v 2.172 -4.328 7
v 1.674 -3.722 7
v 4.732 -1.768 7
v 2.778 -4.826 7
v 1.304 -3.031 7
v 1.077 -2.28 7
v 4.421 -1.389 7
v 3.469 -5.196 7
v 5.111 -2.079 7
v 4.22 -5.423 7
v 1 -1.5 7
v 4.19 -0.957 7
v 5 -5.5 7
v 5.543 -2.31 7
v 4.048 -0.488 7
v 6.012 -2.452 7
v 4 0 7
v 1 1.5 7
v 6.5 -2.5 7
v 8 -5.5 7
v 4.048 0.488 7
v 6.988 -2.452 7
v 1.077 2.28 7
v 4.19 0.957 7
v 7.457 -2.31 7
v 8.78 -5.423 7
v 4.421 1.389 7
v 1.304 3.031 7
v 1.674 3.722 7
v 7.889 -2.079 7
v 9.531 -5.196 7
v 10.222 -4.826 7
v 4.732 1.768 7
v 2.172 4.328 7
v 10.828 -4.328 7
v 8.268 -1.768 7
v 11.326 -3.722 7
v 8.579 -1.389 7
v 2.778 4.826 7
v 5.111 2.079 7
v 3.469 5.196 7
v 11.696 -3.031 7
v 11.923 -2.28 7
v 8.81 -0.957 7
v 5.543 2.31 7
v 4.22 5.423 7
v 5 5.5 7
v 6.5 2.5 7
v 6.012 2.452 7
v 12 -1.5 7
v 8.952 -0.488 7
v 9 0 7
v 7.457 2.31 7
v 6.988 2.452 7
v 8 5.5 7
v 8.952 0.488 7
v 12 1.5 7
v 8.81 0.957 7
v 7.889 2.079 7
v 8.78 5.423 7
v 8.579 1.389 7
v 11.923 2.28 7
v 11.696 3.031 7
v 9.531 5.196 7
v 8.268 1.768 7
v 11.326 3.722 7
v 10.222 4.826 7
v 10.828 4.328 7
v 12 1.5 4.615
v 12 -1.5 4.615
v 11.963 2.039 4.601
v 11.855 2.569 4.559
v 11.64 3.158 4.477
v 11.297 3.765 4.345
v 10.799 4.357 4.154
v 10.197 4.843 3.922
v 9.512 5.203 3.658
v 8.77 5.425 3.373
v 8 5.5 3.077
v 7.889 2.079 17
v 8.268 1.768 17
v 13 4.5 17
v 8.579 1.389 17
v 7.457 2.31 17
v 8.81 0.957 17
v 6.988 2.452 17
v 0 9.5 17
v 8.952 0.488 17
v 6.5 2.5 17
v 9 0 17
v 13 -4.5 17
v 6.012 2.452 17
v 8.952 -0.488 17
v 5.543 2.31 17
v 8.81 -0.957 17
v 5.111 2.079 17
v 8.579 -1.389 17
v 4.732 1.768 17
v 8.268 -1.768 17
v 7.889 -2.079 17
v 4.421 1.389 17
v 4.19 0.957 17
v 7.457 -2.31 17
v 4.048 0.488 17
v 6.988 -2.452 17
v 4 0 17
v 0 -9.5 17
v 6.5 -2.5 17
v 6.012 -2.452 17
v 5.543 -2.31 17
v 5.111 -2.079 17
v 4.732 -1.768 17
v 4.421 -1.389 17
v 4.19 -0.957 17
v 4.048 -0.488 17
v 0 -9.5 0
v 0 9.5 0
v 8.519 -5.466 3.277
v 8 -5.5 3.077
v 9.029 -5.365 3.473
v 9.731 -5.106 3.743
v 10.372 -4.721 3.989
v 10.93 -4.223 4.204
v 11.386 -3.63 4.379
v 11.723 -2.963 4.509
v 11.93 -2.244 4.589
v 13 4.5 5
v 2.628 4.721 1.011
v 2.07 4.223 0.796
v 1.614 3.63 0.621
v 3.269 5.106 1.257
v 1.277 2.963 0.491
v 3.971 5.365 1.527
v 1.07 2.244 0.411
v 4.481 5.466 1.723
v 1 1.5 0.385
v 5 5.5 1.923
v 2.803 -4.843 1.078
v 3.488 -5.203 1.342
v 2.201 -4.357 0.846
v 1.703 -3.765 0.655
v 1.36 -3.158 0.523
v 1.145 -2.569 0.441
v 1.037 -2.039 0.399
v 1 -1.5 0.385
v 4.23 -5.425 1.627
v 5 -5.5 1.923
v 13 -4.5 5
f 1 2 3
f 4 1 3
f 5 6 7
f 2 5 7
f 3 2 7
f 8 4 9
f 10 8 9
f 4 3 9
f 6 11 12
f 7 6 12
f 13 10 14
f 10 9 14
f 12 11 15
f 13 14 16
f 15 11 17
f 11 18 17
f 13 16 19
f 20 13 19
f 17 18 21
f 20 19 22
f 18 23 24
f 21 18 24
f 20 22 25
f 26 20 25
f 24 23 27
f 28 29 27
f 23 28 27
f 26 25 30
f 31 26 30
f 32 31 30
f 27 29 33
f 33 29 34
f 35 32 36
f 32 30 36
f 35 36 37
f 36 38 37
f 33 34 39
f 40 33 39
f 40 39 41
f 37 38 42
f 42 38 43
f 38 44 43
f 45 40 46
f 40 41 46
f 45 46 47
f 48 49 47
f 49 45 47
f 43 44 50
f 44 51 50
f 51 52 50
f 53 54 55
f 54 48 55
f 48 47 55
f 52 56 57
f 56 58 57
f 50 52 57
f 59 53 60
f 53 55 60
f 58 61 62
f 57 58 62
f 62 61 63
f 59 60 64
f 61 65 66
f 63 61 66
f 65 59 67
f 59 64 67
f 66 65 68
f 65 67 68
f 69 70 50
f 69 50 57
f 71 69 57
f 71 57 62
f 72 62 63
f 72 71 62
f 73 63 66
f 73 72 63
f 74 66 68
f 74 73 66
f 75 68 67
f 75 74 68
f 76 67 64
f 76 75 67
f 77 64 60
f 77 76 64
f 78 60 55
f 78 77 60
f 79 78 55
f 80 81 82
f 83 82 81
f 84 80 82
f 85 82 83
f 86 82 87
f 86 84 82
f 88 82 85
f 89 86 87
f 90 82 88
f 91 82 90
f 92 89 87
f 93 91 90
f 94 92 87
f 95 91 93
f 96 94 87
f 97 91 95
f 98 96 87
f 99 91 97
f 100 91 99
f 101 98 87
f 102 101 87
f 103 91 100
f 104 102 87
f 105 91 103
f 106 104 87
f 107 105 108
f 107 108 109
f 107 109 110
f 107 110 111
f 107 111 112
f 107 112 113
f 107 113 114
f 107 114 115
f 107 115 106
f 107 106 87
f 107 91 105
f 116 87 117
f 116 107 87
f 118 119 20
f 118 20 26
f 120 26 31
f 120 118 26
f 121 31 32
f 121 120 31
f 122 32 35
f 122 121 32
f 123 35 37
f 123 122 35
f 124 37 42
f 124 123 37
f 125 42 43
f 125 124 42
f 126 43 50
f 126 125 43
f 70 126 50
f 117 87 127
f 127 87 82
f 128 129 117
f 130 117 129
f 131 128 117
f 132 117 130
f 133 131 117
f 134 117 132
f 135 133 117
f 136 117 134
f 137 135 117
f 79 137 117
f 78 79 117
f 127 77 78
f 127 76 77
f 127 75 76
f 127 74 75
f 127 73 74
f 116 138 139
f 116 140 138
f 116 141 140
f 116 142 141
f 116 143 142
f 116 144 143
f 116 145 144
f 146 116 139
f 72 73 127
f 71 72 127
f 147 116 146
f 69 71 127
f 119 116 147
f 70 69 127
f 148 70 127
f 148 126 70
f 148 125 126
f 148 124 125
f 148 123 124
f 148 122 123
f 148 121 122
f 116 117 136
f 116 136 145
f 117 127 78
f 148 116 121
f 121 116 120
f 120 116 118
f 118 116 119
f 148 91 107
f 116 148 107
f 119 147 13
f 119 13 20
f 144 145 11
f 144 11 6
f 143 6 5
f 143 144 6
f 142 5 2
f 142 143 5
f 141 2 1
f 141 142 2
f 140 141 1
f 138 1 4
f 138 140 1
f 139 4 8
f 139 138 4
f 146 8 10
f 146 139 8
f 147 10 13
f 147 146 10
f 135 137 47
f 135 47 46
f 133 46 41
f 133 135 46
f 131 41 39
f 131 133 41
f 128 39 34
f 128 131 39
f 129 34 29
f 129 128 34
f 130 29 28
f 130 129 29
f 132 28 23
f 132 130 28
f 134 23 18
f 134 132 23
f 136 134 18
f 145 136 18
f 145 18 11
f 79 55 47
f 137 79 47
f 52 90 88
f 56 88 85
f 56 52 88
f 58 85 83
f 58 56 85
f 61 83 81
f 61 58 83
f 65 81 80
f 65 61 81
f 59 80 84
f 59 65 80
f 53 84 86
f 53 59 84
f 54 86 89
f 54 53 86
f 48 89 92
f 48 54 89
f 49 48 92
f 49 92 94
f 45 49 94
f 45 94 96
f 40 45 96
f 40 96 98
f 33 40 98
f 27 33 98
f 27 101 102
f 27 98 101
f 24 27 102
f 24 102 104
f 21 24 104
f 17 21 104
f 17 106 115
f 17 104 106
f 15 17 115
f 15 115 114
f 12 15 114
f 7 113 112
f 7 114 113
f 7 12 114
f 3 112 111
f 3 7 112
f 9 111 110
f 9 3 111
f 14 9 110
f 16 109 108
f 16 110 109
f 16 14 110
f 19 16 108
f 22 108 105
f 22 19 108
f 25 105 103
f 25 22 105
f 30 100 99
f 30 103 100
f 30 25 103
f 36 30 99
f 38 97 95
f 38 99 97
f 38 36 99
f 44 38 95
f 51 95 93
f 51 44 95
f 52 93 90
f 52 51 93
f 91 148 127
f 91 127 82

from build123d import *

# Parameters (mm, degrees)
F1_DEPTH = 9.5
F3_DEPTH = 25
F4_R     = 2.5
F5_DEPTH = 7
F6_DEPTH = 25


with BuildPart() as f1:
    # F0 (on Front) → F1 (new body, symmetric)
    with BuildSketch(Plane.XZ):
        Polygon((0, 17), (0, 0), (13, 5), (13, 17), align=None)
    extrude(amount=F1_DEPTH, both=True)

    # F2 (on face) → F3 (cut)
    with BuildSketch(Plane.XY.offset(17)):
        Polygon((13, 9.5), (0, 9.5), (13, 4.5), align=None)
        Polygon((13, -9.5), (13, -4.5), (0, -9.5), align=None)
    extrude(amount=-F3_DEPTH, mode=Mode.SUBTRACT)

    # F4 (on Top) → F5 (cut)
    with BuildSketch(Plane.XY):
        with BuildLine():
            ThreePointArc((12, 1.5), (10.828427, 4.328427), (8, 5.5))
            Line((8, 5.5), (5, 5.5))
            ThreePointArc((5, 5.5), (2.171573, 4.328427), (1, 1.5))
            Line((1, 1.5), (1, -1.5))
            ThreePointArc((1, -1.5), (2.171573, -4.328427), (5, -5.5))
            Line((5, -5.5), (8, -5.5))
            ThreePointArc((8, -5.5), (10.828427, -4.328427), (12, -1.5))
            Line((12, -1.5), (12, 1.5))
        make_face()
        with Locations((6.5, 0)):
            Circle(F4_R, mode=Mode.SUBTRACT)
    extrude(amount=F5_DEPTH, mode=Mode.SUBTRACT)

    # F4 (on Top) → F6 (cut)
    with BuildSketch(Plane.XY):
        with Locations((6.5, 0)):
            Circle(F4_R)
    extrude(amount=F6_DEPTH, mode=Mode.SUBTRACT)


solid = f1.part
